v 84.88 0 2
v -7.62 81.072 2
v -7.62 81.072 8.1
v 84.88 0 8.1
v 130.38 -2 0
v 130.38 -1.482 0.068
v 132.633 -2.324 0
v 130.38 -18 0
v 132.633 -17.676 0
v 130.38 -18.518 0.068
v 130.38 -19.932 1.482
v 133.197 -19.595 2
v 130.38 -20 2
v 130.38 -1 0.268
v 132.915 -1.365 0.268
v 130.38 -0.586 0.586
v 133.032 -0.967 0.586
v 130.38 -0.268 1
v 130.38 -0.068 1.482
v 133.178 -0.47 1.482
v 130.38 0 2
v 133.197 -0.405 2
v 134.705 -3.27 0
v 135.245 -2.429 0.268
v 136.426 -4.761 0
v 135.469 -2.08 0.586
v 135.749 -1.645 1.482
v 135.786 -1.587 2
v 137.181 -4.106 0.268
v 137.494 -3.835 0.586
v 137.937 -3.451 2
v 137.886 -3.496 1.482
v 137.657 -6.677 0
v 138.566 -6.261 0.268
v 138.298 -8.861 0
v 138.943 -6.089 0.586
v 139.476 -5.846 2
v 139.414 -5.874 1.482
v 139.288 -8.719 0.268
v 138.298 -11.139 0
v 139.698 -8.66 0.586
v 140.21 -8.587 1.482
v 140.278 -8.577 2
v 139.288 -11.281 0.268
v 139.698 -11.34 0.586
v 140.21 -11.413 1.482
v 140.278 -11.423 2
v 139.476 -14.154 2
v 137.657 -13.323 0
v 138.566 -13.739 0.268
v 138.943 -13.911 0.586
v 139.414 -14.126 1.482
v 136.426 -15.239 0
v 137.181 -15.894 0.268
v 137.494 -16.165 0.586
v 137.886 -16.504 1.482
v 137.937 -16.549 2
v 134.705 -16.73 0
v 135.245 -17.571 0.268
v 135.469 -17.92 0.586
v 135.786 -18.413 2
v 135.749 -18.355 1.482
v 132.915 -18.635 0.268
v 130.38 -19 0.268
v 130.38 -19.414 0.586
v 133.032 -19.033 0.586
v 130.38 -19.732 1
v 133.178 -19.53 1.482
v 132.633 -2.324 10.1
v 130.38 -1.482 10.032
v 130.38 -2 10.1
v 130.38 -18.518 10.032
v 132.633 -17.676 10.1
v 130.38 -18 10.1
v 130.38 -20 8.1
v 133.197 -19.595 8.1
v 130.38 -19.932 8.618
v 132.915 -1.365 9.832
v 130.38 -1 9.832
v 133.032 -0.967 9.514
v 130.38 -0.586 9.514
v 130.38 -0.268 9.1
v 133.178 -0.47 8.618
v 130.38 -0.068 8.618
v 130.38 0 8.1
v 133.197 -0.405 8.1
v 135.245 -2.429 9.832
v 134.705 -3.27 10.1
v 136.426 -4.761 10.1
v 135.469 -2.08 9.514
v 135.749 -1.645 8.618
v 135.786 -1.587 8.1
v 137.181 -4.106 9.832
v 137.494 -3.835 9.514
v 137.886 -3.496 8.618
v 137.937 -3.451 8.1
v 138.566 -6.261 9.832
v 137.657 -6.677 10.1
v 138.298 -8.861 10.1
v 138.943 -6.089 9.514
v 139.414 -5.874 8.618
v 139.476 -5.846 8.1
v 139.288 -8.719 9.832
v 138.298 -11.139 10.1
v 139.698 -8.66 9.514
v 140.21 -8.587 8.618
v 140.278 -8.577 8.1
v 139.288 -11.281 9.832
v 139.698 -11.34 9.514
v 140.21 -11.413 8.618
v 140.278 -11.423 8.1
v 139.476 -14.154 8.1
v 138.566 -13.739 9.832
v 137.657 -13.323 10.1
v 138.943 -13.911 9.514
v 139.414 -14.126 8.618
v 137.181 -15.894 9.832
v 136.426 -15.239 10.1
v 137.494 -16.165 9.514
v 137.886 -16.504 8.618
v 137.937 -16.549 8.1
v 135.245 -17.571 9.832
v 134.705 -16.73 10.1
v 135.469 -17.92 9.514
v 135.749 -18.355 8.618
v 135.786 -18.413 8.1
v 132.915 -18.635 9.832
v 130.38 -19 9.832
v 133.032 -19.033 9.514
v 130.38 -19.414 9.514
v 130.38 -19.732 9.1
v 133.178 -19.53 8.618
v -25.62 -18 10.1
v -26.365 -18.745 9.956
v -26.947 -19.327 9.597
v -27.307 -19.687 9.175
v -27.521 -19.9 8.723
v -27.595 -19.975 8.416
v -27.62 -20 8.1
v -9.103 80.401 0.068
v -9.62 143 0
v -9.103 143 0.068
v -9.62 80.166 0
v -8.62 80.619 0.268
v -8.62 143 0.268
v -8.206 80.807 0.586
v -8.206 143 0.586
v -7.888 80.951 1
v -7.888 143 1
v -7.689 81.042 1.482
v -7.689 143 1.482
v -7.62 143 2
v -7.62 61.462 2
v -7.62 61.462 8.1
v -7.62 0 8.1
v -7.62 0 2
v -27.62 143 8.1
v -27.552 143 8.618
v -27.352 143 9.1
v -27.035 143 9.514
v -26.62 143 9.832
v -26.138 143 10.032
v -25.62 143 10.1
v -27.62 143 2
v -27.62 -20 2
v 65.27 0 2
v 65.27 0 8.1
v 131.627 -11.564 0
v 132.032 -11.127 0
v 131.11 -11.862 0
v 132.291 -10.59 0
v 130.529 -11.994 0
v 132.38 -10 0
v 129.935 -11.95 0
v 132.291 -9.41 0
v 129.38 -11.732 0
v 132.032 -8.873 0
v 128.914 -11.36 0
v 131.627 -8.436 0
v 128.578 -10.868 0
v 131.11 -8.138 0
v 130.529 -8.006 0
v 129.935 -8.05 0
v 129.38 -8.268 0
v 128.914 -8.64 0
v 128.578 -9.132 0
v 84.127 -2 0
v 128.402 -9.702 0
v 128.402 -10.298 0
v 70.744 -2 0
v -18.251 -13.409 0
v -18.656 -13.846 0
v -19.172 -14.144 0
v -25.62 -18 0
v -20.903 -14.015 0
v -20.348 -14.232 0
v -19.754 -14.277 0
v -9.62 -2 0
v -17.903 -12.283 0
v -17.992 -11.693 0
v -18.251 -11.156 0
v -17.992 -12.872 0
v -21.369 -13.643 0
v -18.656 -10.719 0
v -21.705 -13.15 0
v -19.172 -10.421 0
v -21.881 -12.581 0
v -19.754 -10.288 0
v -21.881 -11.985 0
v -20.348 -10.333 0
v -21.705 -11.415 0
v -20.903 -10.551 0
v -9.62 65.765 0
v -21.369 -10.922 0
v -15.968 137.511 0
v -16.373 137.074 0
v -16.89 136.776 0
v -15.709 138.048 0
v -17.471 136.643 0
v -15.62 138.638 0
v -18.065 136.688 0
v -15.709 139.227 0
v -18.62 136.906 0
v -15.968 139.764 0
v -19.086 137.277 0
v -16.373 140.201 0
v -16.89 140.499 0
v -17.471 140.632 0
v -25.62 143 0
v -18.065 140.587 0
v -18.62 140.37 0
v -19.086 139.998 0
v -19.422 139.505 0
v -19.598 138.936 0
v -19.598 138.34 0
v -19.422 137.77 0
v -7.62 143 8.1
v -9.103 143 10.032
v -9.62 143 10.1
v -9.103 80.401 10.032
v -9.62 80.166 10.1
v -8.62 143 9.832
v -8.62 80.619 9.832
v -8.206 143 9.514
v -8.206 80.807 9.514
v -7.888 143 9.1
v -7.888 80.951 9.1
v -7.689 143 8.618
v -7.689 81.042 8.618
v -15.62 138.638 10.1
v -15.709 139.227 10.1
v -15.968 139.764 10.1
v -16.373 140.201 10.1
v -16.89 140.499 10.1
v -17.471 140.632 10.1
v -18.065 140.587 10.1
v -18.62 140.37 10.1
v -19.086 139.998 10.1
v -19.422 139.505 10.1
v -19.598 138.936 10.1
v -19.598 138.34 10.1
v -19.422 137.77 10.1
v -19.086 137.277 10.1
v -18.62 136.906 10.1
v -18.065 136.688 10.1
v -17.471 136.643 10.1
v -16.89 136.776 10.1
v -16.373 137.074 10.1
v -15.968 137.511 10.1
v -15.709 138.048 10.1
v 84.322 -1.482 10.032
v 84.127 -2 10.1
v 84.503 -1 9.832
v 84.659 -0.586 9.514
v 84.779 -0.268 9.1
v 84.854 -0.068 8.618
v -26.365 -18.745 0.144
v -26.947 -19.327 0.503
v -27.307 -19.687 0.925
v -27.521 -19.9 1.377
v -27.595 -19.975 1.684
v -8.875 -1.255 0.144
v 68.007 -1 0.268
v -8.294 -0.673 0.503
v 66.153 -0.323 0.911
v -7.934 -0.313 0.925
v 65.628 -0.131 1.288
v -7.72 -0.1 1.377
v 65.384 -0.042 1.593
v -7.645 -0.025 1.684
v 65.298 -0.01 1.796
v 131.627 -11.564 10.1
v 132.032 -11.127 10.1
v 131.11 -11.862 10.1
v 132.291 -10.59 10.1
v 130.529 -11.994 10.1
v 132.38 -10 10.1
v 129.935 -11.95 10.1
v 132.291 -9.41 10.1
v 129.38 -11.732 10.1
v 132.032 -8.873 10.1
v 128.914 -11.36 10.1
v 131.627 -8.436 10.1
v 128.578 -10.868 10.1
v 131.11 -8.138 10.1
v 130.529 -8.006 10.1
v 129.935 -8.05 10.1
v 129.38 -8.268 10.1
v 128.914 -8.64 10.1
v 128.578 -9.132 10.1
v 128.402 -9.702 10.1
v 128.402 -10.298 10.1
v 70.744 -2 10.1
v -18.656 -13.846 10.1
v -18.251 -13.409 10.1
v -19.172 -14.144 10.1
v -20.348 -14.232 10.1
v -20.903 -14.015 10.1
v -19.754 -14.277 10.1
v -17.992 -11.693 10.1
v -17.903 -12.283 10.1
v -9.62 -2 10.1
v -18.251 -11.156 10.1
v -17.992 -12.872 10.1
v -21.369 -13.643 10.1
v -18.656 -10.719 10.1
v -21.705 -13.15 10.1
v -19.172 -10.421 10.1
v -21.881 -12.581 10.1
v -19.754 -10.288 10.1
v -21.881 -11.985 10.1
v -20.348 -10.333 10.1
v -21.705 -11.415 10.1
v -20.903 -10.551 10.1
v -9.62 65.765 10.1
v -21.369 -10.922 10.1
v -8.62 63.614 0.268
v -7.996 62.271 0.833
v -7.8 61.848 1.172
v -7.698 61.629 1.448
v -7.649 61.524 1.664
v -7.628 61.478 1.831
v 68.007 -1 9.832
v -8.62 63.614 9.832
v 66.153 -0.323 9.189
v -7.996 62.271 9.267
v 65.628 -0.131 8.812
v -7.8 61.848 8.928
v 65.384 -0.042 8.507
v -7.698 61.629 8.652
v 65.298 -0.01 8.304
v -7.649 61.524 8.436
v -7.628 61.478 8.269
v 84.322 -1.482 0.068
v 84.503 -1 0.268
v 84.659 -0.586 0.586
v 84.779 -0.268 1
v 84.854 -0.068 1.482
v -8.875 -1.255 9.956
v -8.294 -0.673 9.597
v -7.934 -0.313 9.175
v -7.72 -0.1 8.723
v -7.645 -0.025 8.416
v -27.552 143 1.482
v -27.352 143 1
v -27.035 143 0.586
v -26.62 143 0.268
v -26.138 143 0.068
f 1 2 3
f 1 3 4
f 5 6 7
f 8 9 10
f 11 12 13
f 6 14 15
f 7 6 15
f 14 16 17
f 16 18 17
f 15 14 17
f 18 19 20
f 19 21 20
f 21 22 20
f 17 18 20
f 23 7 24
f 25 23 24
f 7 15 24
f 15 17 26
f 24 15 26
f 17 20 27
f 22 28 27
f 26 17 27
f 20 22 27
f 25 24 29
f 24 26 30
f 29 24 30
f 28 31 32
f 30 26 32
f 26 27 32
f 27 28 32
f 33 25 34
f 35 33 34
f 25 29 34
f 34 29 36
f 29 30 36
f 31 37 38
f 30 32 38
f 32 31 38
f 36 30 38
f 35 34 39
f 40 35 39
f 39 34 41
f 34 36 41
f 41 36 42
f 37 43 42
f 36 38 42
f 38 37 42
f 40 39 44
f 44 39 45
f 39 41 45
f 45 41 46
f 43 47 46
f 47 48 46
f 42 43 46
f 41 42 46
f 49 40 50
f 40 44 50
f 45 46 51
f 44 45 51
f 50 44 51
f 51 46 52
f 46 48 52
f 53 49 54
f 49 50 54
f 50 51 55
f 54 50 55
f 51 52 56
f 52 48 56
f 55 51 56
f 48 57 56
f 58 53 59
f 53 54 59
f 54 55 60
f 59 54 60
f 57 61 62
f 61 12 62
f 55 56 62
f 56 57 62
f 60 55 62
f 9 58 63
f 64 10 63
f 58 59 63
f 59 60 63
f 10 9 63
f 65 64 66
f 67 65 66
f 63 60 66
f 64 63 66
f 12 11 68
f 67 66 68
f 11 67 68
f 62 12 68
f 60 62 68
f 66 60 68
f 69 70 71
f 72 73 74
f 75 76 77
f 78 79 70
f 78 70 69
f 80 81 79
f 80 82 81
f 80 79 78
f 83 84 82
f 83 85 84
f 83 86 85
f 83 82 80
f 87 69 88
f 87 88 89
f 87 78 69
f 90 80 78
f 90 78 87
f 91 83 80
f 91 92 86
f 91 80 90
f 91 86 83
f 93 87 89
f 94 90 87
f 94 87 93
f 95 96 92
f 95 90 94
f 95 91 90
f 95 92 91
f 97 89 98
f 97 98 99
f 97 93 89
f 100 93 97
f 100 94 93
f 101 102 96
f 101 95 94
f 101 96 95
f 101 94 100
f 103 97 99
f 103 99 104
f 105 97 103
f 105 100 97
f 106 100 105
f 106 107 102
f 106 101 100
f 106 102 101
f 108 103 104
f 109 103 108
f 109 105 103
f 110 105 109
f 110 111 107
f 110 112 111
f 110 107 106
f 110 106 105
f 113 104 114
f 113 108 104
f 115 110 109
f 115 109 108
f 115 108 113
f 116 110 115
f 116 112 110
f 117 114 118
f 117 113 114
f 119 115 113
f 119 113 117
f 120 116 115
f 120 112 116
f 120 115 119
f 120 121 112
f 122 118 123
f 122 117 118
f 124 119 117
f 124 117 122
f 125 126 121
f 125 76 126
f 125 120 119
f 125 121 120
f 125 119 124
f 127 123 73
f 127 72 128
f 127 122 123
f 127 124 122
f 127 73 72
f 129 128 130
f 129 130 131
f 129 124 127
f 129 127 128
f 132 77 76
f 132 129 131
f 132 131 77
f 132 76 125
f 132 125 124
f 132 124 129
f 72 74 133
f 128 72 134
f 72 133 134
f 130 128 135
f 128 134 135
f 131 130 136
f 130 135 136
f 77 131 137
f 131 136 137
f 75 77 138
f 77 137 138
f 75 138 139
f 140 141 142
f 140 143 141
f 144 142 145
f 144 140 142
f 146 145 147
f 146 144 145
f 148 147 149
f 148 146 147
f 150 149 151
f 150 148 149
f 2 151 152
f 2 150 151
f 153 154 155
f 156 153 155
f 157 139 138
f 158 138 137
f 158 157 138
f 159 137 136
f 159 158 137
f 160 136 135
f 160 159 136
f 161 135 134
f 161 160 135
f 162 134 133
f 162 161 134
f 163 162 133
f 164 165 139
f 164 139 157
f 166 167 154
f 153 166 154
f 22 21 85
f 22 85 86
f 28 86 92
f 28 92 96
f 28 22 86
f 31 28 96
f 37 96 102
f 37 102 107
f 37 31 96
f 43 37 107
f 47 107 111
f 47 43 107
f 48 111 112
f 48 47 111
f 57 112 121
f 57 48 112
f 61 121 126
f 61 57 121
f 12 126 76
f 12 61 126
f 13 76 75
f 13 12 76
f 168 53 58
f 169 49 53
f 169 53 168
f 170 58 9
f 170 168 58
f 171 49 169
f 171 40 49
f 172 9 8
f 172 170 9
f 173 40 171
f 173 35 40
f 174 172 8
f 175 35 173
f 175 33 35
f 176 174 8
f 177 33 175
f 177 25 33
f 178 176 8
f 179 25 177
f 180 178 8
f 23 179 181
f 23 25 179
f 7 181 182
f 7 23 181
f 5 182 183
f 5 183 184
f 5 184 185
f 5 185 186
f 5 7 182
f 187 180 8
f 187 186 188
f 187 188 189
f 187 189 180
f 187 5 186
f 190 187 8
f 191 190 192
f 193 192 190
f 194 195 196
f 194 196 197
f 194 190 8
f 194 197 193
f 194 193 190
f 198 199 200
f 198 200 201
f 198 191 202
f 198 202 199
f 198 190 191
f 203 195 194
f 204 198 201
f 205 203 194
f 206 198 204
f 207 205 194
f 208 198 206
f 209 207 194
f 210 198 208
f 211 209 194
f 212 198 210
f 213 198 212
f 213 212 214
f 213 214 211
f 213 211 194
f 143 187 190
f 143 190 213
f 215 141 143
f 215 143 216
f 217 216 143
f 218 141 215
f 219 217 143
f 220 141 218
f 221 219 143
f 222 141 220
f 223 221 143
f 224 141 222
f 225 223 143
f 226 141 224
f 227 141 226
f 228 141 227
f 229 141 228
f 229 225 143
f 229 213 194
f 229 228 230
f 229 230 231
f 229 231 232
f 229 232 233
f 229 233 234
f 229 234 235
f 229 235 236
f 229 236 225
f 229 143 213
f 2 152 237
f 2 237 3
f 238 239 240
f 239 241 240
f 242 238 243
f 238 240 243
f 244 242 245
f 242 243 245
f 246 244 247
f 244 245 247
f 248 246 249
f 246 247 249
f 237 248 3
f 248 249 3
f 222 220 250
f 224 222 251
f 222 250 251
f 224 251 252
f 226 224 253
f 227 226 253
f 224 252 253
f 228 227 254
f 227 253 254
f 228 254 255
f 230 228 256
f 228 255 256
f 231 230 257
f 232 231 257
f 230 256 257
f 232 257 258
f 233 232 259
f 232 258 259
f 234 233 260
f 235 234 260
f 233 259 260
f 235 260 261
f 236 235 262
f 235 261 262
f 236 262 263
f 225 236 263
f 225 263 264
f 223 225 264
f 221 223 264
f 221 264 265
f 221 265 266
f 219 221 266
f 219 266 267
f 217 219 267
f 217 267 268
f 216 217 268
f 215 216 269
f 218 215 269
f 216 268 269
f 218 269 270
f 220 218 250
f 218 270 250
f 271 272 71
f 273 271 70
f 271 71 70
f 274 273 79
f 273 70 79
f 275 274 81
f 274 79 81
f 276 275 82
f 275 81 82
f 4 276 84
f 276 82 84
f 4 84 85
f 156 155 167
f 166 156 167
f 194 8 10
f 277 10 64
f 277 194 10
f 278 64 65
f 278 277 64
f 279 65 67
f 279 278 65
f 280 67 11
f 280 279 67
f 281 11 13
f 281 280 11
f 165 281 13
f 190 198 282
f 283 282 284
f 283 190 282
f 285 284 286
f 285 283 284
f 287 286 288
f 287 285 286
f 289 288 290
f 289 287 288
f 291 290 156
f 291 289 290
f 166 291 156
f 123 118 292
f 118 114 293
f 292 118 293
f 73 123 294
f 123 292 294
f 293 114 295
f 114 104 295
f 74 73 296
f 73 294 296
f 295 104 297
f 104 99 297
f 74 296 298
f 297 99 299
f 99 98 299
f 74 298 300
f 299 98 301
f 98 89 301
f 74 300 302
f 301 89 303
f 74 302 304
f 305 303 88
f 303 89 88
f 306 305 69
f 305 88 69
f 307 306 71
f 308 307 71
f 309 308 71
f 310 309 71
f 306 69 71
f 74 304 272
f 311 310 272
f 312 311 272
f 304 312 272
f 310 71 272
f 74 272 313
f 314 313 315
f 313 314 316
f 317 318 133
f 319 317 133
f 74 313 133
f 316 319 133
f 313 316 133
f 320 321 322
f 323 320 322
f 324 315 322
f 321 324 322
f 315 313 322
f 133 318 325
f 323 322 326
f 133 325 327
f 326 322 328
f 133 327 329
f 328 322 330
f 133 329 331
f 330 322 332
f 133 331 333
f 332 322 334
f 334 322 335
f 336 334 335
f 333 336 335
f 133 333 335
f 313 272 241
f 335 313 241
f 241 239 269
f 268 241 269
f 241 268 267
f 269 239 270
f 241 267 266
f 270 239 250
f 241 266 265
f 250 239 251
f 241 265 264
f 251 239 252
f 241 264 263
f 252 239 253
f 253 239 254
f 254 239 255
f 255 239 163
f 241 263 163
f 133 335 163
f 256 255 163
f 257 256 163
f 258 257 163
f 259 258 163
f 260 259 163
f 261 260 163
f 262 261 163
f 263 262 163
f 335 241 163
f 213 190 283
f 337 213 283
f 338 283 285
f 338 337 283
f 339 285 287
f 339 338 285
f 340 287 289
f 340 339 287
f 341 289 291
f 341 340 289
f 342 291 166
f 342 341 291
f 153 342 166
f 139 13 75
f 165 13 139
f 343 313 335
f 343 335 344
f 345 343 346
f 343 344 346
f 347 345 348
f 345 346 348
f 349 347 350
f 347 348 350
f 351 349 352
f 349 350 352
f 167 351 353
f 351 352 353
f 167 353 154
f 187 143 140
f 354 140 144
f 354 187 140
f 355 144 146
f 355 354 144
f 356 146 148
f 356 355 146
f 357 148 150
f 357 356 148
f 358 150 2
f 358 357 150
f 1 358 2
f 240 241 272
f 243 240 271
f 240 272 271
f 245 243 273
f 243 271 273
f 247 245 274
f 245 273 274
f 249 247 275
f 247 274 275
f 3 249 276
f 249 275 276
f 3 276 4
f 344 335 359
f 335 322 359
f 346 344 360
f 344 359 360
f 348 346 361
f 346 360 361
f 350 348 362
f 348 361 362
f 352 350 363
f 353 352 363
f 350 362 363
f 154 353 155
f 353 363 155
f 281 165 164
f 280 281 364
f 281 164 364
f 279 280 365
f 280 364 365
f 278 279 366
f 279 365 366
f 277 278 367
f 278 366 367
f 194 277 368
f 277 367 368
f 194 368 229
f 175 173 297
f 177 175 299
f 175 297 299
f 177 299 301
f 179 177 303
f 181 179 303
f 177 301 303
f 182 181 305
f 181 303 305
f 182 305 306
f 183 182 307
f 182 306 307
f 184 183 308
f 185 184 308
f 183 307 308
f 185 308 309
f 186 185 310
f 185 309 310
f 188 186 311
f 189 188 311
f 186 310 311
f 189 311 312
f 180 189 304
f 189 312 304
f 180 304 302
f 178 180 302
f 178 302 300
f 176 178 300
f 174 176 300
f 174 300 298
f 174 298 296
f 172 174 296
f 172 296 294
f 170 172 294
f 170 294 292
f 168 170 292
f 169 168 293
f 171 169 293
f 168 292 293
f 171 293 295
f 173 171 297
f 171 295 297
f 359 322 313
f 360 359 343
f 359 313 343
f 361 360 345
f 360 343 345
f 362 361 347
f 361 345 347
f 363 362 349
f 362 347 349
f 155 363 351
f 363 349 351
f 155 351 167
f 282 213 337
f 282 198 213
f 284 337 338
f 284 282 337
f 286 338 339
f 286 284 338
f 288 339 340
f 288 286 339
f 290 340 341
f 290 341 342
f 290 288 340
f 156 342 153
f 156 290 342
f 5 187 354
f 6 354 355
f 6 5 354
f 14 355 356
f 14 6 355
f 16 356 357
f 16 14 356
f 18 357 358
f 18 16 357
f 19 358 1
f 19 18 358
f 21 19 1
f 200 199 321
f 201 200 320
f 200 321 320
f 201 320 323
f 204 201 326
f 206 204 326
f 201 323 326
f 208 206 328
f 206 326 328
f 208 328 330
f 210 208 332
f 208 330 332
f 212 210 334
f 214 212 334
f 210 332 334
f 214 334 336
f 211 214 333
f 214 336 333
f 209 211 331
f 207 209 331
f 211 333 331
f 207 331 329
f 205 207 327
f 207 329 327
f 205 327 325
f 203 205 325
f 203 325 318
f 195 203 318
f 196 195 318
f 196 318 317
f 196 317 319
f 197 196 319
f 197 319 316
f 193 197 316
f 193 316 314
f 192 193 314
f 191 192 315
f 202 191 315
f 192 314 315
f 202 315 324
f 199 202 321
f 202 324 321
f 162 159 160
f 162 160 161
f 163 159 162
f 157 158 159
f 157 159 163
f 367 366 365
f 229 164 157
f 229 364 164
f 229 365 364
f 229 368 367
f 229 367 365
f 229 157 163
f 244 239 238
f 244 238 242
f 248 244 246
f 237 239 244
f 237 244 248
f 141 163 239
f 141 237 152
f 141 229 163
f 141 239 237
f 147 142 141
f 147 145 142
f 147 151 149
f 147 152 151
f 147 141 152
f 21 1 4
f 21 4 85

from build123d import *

# Parameters (mm, degrees)
SALIENTE_EXTRUIR1_DEPTH = 10.1
CORTAR_EXTRUIR1_DEPTH   = 10.1
REDONDEO1_R             = 2
CROQUIS3_R              = 2
CORTAR_EXTRUIR2_DEPTH   = 10.1


with BuildPart() as part:
    # Croquis1 → Saliente-Extruir1 (new body)
    with BuildSketch(Plane.XY):
        with BuildLine():
            Line((84.879626458, -20), (-27.620373542, -20))
            Line((-27.620373542, -20), (-27.620373542, 81.07249842))
            Line((-27.620373542, 81.07249842), (-27.620373542, 143))
            Line((-27.620373542, 143), (-7.620373542, 143))
            Line((-7.620373542, 143), (-7.620373542, 81.07249842))
            Line((-7.620373542, 81.07249842), (84.879626458, 0))
            Line((84.879626458, 0), (130.379626458, 0))
            ThreePointArc((130.379626458, 0), (140.379626458, -10), (130.379626458, -20))
            Line((130.379626458, -20), (84.879626458, -20))
        make_face()
    extrude(amount=SALIENTE_EXTRUIR1_DEPTH)

    # Croquis2 → Cortar-Extruir1 (cut)
    with BuildSketch(Plane.XY.offset(10.1)):
        Polygon((-7.620373542, 61.46249842), (-7.620373542, 0), (65.269626458, 0), align=None)
    extrude(amount=-CORTAR_EXTRUIR1_DEPTH, mode=Mode.SUBTRACT)

    # Redondeo1
    redondeo1_edges = [part.edges().sort_by_distance(p)[0] for p in [
        (-7.620373542, 112.03624921, 0),
        (38.629626458, 40.53624921, 0),
        (107.629626458, 0, 0),
        (140.379626458, -10, 0),
        (107.629626458, 0, 10.1),
        (38.629626458, 40.53624921, 10.1),
        (-7.620373542, 112.03624921, 10.1),
        (-27.620373542, 61.5, 10.1),
        (-7.620373542, 30.73124921, 0),
        (28.824626458, 30.73124921, 10.1),
        (28.824626458, 0, 0),
        (28.824626458, 30.73124921, 0),
        (-7.620373542, 30.73124921, 10.1),
        (28.824626458, 0, 10.1),
        (51.379626458, -20, 10.1),
        (140.379626458, -10, 10.1),
        (51.379626458, -20, 0),
        (-27.620373542, 61.5, 0),
    ]]
    fillet(redondeo1_edges, radius=REDONDEO1_R)

    # Croquis3 → Cortar-Extruir2 (cut)
    with BuildSketch(Plane.XY.offset(10.1)):
        with Locations((130.379626458, -10)):
            Circle(CROQUIS3_R)
        with Locations((-19.903008845, -12.282635303)):
            Circle(CROQUIS3_R)
        with Locations((-17.620373542, 138.637591641)):
            Circle(CROQUIS3_R)
    extrude(amount=-CORTAR_EXTRUIR2_DEPTH, mode=Mode.SUBTRACT)


solid = part.part
